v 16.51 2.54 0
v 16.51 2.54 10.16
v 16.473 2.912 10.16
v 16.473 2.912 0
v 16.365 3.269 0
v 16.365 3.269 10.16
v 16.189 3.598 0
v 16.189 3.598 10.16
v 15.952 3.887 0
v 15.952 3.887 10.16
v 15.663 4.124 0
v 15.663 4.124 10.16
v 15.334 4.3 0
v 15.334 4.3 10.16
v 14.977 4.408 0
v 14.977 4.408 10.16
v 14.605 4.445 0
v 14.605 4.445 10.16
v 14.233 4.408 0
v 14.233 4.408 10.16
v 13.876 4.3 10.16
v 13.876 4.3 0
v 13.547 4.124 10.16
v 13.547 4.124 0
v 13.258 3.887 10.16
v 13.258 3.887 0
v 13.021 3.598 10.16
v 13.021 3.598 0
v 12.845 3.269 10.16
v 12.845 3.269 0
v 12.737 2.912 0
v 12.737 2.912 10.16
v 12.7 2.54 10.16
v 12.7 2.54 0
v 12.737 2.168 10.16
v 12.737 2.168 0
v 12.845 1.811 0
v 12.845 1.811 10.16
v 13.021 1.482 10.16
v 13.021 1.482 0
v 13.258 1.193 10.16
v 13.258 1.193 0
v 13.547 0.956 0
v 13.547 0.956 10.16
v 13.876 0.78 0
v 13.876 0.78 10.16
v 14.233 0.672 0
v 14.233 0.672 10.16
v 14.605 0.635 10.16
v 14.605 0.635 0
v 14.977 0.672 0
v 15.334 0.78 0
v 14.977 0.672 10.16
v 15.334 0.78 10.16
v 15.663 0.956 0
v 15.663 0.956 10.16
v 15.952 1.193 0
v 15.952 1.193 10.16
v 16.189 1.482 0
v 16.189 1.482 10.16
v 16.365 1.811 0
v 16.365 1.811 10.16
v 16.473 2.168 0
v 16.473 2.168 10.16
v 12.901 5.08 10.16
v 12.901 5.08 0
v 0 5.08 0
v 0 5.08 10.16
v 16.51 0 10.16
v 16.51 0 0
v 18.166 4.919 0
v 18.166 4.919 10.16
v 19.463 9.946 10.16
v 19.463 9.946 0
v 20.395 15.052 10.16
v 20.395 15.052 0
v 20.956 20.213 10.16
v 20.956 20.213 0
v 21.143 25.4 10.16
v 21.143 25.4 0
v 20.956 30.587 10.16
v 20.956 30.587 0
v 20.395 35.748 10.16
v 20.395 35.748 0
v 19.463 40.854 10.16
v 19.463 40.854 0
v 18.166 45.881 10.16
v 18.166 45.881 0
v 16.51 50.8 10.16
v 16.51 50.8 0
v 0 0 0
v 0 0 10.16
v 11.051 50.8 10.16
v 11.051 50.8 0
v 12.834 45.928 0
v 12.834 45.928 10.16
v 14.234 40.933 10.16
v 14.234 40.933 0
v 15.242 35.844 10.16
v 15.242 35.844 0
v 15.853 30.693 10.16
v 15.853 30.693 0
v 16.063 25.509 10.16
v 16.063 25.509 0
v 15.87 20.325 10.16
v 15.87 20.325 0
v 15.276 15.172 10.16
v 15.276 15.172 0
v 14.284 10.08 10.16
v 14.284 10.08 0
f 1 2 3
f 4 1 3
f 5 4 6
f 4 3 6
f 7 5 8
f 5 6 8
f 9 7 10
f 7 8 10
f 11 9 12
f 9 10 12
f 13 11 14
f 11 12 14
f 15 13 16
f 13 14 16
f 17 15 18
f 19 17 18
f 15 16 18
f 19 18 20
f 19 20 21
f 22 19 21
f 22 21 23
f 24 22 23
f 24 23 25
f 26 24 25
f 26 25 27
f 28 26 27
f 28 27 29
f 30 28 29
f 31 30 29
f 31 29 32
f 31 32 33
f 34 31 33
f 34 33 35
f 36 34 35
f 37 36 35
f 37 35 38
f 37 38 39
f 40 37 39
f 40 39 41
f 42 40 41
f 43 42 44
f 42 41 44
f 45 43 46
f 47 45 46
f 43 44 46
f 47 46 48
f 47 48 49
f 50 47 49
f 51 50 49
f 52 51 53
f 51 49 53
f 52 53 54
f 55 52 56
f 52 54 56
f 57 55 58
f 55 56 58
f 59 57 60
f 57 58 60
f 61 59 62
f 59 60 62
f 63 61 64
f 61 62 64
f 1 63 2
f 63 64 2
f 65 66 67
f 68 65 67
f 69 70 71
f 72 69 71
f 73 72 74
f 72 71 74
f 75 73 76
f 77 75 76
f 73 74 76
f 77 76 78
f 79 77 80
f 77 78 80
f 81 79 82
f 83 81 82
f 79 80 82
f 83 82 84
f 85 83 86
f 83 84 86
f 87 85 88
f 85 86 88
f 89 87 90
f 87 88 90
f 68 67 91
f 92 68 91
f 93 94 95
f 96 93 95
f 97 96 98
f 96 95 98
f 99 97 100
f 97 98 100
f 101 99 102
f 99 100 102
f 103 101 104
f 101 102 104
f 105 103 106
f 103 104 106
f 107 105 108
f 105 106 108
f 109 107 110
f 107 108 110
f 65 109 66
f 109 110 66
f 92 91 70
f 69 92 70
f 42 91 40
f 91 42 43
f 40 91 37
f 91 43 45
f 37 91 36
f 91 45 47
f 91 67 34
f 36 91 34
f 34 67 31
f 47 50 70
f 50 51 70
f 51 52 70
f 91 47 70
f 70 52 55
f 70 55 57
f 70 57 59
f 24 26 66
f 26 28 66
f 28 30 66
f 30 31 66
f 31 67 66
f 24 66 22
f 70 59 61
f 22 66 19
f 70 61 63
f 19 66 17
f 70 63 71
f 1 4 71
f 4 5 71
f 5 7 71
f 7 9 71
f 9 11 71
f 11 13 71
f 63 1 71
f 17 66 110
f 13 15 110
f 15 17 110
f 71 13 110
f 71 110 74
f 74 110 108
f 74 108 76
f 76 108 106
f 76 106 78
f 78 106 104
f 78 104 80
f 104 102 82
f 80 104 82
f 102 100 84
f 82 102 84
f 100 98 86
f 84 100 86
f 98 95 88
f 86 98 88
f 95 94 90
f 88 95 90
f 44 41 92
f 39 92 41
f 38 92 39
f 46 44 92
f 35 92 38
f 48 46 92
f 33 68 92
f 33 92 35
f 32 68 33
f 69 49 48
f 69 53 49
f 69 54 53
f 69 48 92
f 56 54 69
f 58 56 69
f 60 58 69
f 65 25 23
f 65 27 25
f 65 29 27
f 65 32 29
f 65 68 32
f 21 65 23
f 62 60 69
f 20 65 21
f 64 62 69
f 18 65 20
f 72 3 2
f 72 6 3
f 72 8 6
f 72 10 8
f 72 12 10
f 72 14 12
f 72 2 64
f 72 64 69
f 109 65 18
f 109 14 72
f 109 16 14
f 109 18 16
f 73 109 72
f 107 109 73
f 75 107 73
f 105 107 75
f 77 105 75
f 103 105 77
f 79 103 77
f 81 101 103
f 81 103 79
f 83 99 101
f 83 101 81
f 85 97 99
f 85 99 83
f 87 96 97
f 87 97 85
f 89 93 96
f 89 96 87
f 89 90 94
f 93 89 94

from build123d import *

# Parameters (mm, degrees)
BOSS_EXTRUDE1_DEPTH     = 10.16
SKETCH2_R               = 1.905
CUT_EXTRUDE1_DEPTH      = 1
CUT_EXTRUDE1_DEPTH_BACK = 11.16


with BuildPart() as part:
    # Sketch1 → Boss-Extrude1 (new body)
    with BuildSketch(Plane.XY):
        with BuildLine():
            Line((0, 0), (16.51, 0))
            ThreePointArc((16.51, 0), (21.143005914, 25.4), (16.51, 50.8))
            Line((16.51, 50.8), (11.050639123, 50.8))
            ThreePointArc((11.050639123, 50.8), (16.008340976, 28.103171462), (12.900542854, 5.08))
            Line((12.900542854, 5.08), (0, 5.08))
            Line((0, 5.08), (0, 0))
        make_face()
    extrude(amount=BOSS_EXTRUDE1_DEPTH)

    # Sketch2 → Cut-Extrude1 (cut, two sides)
    with BuildSketch(Plane.XY.offset(10.16)) as cut_extrude1_sk:
        with Locations((14.605, 2.54)):
            Circle(SKETCH2_R)
    extrude(amount=CUT_EXTRUDE1_DEPTH, mode=Mode.SUBTRACT)
    extrude(cut_extrude1_sk.sketch, amount=-CUT_EXTRUDE1_DEPTH_BACK, mode=Mode.SUBTRACT)


solid = part.part
